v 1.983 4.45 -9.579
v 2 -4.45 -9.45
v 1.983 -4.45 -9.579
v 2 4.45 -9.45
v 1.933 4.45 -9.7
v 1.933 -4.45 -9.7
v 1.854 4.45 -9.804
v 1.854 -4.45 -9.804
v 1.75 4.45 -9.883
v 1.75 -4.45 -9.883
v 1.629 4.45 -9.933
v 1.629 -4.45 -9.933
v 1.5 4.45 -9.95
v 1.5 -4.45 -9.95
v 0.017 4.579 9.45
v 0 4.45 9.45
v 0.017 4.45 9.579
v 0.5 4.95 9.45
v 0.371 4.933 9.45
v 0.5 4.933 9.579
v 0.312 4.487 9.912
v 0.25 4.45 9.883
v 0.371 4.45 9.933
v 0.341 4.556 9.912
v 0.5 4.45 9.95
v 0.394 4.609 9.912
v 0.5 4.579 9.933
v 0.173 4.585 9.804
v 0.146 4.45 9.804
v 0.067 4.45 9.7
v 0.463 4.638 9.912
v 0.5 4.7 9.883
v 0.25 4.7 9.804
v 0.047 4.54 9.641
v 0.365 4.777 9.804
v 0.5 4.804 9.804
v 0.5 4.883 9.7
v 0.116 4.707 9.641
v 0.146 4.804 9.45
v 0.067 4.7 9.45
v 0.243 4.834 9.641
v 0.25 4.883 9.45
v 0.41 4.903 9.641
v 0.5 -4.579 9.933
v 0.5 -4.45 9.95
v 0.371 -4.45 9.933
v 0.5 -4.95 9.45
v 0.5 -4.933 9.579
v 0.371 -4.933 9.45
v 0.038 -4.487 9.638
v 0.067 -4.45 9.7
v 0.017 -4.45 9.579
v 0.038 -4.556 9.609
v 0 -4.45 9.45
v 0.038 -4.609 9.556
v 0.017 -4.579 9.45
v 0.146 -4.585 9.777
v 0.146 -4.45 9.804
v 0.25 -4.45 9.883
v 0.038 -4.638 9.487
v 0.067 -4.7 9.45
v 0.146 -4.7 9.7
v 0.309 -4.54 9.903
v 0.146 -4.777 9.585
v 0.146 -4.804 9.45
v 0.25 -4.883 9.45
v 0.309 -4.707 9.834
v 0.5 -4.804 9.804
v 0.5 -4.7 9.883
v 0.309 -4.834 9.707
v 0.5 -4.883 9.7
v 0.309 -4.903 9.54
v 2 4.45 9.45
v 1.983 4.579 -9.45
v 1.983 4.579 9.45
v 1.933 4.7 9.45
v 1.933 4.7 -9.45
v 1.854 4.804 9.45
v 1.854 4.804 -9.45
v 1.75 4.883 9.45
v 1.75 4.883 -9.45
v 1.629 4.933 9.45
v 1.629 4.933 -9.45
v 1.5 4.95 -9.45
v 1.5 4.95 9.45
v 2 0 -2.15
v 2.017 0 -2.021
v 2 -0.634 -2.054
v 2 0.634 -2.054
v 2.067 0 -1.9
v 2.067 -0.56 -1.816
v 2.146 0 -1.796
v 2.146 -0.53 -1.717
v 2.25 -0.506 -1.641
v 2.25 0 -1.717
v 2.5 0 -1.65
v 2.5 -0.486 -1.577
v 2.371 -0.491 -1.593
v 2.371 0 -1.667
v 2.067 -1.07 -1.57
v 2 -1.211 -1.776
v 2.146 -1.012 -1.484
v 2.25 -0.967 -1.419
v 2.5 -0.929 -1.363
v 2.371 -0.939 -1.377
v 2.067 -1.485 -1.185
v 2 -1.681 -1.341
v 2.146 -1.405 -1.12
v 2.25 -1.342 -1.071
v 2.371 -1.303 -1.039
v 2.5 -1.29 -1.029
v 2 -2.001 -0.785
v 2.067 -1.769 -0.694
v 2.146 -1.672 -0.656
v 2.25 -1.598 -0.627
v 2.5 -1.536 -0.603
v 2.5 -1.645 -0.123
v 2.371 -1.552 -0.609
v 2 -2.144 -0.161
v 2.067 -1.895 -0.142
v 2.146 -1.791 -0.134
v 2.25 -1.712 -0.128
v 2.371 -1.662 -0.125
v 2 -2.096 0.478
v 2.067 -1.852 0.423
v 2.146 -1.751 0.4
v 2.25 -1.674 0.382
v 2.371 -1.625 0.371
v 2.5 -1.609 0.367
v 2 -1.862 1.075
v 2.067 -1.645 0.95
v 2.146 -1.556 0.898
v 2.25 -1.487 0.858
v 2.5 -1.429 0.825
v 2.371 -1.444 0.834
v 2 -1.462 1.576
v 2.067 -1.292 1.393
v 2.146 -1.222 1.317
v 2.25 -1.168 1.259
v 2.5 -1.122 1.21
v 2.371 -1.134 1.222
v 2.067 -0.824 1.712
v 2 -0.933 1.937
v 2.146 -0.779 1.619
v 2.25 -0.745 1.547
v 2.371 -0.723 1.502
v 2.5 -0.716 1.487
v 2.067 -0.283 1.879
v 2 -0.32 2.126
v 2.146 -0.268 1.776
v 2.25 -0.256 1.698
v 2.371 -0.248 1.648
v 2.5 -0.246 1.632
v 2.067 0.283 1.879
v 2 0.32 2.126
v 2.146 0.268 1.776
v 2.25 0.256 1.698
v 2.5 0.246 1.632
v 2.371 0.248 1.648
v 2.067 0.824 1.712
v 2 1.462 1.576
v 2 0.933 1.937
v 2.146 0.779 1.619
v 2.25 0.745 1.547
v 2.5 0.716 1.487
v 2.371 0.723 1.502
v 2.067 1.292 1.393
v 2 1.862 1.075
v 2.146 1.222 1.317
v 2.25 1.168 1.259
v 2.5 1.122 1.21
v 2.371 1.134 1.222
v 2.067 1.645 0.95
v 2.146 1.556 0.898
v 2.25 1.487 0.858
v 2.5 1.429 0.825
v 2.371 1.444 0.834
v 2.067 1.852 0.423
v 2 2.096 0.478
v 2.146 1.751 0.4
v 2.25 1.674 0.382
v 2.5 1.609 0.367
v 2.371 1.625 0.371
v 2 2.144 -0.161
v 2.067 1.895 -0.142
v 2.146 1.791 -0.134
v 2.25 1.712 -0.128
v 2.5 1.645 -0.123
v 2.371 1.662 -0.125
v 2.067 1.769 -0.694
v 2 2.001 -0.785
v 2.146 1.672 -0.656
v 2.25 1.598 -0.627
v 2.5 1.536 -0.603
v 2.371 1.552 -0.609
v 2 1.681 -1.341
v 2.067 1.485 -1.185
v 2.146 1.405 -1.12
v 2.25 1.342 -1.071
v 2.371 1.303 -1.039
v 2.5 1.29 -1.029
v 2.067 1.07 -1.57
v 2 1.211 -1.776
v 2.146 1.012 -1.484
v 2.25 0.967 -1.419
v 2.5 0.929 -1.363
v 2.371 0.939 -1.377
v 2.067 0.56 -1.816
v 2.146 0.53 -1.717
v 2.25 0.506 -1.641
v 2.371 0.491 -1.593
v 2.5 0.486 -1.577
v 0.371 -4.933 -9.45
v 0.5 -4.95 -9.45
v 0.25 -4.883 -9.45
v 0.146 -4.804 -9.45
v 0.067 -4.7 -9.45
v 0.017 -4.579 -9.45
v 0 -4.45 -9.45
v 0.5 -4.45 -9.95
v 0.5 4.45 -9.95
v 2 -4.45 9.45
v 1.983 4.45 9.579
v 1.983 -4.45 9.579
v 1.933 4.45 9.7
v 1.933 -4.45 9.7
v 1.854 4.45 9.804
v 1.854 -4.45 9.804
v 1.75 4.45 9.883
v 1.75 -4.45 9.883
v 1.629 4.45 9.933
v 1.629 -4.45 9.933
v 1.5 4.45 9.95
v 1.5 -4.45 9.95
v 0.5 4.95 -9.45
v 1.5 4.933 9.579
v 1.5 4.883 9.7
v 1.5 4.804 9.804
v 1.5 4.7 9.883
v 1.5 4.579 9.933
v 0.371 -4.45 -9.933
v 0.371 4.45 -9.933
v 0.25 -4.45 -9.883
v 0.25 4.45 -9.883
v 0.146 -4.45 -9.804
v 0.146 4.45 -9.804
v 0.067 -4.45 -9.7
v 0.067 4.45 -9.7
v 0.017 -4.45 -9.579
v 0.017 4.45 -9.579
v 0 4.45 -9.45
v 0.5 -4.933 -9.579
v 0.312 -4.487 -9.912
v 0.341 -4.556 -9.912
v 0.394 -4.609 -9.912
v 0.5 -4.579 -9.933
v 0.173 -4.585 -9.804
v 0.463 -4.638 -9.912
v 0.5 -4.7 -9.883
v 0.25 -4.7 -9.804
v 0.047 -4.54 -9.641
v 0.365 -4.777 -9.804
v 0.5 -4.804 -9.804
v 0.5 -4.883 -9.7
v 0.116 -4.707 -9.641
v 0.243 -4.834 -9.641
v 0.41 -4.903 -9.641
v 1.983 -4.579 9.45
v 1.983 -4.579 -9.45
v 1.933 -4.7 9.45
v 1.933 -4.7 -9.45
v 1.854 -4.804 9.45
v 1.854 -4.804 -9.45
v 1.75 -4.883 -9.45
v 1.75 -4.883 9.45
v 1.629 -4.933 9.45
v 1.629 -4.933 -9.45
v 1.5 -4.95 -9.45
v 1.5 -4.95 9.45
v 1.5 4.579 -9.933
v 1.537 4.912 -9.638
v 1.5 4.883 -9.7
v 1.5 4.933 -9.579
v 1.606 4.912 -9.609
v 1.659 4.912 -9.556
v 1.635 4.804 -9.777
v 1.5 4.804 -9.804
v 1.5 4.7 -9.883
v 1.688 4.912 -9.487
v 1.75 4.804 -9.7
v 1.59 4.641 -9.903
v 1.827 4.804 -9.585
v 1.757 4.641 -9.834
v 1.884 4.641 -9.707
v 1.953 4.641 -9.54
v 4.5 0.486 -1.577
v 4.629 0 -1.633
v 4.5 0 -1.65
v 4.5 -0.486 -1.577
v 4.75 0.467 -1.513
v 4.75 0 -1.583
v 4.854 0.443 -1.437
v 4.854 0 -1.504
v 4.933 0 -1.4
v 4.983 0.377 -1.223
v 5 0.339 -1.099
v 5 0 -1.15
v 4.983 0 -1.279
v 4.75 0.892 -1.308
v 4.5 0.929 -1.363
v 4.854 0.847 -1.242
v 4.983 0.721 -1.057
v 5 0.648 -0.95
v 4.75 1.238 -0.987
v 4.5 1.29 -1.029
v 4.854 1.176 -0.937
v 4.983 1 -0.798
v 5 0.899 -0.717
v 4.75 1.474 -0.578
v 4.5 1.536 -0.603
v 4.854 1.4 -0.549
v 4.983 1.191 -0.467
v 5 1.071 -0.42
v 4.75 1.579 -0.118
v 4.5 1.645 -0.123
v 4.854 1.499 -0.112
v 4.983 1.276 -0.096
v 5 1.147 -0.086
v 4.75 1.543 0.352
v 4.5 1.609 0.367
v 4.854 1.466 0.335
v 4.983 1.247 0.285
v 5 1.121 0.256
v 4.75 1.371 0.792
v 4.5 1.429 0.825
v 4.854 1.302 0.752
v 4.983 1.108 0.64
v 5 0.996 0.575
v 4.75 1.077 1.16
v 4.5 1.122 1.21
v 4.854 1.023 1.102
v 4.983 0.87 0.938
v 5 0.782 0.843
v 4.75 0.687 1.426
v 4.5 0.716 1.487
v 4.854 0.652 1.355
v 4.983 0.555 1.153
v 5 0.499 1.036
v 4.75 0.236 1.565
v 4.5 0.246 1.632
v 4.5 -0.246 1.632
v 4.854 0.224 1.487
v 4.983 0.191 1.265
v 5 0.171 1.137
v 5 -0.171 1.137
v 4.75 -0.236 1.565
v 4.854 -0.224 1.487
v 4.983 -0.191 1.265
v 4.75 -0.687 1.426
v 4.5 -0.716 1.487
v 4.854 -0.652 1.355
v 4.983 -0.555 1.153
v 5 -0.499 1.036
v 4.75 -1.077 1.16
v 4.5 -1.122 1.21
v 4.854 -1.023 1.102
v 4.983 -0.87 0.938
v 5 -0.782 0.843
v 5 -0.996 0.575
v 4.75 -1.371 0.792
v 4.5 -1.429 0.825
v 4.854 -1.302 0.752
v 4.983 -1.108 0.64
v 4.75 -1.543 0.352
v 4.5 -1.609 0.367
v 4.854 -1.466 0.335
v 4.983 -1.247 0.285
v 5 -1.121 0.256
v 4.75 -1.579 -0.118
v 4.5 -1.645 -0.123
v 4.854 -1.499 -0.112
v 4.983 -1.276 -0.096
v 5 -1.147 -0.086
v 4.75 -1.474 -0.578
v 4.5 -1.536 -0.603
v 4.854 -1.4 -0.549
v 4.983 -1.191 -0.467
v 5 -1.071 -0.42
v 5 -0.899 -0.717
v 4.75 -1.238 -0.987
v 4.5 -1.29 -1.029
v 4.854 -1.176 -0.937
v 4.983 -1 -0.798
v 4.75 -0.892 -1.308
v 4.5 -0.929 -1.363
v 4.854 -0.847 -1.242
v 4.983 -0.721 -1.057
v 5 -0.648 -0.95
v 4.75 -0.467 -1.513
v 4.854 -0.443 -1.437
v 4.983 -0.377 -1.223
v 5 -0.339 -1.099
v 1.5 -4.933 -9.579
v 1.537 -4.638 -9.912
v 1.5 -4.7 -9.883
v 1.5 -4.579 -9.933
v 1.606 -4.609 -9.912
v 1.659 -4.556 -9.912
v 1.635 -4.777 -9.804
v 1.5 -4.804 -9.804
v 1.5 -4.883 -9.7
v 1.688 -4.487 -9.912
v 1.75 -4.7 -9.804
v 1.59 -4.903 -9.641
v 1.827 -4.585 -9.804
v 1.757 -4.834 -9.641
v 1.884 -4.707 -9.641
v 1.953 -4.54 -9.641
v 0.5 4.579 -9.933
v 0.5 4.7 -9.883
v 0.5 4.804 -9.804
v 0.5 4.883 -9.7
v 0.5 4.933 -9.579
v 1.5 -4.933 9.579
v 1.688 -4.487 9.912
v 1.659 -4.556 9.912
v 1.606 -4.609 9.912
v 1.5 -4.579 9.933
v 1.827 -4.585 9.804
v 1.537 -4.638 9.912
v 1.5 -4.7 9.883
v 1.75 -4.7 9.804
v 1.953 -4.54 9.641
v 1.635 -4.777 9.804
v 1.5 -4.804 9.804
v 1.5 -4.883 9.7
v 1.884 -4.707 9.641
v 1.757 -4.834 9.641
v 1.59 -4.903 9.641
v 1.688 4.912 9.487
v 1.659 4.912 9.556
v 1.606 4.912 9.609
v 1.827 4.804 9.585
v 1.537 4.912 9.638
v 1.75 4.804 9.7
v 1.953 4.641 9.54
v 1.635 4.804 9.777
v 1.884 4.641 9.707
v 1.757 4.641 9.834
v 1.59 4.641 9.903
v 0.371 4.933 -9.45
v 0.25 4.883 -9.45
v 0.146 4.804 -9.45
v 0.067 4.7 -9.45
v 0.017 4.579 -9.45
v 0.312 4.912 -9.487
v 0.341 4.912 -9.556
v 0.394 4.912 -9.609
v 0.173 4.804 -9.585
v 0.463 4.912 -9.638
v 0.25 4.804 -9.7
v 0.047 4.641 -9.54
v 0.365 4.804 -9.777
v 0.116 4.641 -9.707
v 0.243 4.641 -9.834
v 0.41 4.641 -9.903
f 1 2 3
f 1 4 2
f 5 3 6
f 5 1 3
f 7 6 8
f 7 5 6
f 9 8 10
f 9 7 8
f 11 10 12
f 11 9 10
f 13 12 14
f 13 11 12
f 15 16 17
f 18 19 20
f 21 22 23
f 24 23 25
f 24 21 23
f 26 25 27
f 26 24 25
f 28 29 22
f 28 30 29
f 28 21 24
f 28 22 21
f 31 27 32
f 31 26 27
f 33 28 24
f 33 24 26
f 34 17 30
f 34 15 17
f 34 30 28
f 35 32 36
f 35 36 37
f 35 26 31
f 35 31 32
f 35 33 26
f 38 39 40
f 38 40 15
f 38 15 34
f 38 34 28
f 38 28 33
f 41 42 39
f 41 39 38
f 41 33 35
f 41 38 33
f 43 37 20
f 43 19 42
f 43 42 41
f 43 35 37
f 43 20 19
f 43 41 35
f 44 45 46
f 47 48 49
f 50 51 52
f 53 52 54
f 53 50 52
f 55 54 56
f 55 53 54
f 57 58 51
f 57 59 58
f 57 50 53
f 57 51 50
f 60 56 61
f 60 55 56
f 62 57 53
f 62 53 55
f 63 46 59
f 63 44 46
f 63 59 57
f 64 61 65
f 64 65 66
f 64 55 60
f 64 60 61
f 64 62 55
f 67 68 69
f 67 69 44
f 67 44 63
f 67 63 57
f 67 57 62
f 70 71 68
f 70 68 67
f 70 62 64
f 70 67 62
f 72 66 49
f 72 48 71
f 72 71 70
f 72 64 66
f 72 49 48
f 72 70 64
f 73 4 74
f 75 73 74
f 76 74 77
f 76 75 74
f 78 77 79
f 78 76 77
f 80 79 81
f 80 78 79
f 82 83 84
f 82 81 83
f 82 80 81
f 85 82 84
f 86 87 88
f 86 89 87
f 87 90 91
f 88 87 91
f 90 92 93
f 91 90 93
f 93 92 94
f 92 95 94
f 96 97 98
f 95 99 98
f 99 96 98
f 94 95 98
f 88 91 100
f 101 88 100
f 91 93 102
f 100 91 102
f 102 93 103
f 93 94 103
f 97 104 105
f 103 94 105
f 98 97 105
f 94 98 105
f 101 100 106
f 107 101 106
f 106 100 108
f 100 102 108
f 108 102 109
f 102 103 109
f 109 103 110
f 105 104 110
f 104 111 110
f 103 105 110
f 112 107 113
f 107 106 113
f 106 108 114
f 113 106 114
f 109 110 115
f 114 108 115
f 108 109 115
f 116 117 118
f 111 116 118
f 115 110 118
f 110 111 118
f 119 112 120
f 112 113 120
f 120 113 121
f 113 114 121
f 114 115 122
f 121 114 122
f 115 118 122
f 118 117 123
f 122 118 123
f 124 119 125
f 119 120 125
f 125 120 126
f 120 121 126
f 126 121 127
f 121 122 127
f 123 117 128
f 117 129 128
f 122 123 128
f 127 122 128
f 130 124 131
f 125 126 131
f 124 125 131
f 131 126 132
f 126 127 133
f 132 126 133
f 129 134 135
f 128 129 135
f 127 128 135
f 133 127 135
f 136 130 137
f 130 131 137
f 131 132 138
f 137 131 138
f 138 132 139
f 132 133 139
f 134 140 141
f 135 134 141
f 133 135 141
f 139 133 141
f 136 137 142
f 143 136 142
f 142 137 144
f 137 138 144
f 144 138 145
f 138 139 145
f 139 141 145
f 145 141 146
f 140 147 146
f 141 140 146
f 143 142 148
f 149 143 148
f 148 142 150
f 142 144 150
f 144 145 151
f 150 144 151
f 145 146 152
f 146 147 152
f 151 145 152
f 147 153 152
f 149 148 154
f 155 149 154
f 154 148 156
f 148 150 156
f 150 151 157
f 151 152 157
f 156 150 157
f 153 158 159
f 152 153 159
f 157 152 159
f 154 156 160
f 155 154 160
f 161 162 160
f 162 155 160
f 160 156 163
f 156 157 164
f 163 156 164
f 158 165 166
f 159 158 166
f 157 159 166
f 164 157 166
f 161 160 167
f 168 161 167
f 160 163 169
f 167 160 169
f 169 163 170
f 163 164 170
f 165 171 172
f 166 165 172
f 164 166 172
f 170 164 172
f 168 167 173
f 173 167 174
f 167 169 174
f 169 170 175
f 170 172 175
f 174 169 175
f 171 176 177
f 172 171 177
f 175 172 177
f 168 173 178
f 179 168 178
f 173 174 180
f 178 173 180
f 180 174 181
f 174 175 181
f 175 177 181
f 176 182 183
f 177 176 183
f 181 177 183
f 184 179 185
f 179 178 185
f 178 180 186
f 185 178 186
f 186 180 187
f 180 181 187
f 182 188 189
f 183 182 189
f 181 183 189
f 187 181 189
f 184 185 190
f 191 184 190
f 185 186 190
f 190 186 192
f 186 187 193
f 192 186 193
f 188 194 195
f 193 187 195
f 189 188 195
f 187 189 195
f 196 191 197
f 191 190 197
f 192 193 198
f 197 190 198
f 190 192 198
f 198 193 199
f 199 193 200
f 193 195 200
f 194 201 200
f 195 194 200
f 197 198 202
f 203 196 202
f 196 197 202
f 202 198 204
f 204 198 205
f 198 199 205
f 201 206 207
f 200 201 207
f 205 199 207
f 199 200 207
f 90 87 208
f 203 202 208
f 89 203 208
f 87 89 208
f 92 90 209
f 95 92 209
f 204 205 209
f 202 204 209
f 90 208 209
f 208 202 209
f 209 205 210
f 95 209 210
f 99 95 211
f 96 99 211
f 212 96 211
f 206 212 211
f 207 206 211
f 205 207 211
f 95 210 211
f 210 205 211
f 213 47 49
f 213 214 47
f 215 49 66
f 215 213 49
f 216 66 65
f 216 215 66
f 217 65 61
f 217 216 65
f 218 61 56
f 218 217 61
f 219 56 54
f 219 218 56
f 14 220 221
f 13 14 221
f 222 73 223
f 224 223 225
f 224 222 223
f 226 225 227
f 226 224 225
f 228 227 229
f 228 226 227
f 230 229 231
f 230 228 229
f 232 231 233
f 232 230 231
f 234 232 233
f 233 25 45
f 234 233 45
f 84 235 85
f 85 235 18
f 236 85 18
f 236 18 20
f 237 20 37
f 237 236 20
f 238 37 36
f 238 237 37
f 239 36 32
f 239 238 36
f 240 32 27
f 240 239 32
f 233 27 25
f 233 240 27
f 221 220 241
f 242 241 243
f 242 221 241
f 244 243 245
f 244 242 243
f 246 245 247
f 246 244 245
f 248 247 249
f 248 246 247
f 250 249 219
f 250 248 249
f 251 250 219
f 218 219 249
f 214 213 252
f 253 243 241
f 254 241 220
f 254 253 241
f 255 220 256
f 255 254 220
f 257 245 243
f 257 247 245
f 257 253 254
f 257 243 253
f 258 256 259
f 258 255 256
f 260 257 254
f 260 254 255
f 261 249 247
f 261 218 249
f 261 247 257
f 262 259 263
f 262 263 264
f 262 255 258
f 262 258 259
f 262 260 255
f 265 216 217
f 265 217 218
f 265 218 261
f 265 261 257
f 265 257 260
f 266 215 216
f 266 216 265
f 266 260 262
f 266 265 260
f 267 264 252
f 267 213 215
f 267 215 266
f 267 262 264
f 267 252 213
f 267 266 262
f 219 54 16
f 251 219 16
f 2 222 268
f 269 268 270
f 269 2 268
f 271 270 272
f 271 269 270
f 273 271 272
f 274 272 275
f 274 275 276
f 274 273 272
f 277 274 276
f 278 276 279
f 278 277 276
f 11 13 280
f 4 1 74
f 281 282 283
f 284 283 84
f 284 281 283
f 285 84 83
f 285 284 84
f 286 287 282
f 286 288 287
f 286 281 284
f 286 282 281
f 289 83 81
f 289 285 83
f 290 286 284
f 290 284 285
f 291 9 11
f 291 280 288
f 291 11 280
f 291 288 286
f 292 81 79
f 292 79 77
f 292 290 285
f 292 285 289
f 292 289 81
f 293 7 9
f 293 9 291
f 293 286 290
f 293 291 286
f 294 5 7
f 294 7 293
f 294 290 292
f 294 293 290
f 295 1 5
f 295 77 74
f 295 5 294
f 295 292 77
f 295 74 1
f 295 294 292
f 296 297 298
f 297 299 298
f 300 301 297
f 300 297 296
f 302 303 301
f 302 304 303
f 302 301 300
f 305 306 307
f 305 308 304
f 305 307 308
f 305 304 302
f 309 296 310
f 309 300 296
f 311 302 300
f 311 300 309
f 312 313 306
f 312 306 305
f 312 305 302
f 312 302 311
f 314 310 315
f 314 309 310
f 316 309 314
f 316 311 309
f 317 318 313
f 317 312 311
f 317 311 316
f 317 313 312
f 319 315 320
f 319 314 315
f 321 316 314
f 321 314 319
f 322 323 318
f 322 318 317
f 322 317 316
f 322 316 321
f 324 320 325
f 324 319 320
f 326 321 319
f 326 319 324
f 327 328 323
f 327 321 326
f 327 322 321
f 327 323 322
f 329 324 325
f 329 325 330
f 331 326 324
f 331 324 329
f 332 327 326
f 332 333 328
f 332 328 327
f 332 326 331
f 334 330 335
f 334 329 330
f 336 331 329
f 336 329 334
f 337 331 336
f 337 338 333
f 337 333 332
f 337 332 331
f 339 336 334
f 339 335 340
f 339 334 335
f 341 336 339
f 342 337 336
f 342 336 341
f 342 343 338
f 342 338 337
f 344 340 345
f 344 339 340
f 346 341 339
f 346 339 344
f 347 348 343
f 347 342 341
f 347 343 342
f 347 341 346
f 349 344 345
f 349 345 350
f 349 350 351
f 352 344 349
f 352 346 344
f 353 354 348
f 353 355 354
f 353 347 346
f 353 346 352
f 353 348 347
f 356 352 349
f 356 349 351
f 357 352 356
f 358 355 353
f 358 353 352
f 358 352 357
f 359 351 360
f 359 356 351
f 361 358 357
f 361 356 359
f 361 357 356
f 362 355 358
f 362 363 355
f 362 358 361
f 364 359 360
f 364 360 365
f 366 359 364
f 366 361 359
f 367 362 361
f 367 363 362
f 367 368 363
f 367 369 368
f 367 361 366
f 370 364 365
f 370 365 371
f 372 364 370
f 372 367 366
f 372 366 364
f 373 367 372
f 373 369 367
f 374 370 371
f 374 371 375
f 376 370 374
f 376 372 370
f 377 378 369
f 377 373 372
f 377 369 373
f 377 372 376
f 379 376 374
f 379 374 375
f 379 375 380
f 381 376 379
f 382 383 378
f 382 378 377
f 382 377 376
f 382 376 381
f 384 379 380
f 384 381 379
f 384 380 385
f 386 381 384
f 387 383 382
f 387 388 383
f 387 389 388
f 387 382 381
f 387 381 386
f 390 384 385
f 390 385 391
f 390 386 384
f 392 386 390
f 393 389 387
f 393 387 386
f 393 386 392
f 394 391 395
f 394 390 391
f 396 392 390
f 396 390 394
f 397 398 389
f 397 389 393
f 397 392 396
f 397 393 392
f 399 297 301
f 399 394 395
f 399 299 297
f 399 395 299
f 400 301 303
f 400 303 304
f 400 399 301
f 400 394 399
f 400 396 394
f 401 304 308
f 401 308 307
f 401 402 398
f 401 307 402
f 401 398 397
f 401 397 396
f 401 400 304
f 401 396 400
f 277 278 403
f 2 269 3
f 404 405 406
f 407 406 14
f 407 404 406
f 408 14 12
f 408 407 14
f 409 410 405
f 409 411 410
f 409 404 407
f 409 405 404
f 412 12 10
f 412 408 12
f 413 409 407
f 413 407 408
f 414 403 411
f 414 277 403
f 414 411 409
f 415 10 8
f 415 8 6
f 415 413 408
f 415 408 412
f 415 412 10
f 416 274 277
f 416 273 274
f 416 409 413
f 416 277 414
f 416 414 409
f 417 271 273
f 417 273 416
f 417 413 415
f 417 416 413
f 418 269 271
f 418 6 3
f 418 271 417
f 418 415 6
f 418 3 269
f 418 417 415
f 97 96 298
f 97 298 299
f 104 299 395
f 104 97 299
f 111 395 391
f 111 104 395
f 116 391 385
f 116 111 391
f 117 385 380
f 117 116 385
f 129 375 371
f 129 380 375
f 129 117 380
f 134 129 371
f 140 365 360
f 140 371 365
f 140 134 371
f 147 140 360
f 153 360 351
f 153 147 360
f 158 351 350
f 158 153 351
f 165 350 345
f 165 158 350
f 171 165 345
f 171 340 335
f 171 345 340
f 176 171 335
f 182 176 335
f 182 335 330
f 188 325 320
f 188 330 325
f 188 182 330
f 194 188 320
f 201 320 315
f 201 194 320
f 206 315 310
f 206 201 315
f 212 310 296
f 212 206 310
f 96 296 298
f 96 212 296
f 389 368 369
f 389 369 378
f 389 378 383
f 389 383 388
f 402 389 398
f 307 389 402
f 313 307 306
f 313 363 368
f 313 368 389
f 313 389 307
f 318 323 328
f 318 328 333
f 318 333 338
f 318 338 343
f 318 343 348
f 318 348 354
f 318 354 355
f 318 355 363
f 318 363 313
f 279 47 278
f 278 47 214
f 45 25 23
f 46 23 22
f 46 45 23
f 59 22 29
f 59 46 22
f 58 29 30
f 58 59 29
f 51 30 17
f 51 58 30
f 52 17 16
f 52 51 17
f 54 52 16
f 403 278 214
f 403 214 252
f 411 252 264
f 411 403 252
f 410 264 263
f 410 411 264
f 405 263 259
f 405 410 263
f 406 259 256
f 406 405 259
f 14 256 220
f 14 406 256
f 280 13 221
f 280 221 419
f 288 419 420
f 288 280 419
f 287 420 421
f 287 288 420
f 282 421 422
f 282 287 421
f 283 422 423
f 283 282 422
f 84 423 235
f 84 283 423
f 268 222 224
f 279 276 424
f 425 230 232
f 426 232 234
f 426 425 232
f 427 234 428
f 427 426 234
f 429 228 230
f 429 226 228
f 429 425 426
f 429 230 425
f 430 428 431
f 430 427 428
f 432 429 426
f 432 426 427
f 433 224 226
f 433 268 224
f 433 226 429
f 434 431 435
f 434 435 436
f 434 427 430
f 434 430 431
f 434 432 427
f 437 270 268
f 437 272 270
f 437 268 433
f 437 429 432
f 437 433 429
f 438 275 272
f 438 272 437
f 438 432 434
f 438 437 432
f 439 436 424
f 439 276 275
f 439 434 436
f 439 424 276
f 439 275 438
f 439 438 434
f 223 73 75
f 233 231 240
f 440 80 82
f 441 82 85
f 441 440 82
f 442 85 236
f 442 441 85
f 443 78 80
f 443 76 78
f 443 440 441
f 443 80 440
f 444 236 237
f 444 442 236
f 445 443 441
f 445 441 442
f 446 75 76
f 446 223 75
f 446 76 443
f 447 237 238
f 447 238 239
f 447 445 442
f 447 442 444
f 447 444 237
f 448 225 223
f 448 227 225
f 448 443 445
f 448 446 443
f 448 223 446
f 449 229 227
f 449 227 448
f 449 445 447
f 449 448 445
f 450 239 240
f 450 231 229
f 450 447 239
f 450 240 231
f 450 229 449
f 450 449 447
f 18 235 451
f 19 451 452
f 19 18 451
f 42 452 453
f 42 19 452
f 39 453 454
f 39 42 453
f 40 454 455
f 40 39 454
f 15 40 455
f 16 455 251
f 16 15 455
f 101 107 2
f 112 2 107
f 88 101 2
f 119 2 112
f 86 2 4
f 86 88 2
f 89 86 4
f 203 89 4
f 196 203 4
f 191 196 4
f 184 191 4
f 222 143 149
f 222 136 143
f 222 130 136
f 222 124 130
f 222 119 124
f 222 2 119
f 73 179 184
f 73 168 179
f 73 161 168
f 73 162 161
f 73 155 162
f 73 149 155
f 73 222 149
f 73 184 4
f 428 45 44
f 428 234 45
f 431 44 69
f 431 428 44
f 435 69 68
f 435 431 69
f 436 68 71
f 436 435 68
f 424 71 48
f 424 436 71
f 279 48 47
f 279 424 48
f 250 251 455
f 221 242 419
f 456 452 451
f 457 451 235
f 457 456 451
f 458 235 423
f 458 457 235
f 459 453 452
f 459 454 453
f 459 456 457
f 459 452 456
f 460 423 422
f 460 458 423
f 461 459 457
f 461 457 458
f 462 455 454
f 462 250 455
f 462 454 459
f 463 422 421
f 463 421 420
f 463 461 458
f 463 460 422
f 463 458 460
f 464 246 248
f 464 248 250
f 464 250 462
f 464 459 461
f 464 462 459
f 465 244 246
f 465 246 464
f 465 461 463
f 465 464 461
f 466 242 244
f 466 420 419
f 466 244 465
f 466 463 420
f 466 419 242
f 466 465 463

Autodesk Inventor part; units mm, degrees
ref_plane "YZ Plane" through (0, 0, 0) normal (1, 0, 0) x (0, 1, 0)
ref_plane "XZ Plane" through (0, 0, 0) normal (0, 1, 0) x (-1, 0, 0)
ref_plane "XY Plane" through (0, 0, 0) normal (0, 0, 1) x (1, 0, 0)
sketch "Sketch1" plane through (0, 0, 0) normal (1, 0, 0) x (0, 1, 0)
  line L0 (0, 13.93) -> (0, -13.93) construction
  line L1 (-6.93, 0) -> (6.93, 0) construction
  line L2 (4.95, 9.95) -> (-4.95, 9.95)
  line L3 (-4.95, 9.95) -> (-4.95, -9.95)
  line L4 (-4.95, -9.95) -> (4.95, -9.95)
  line L5 (4.95, -9.95) -> (4.95, 9.95)
  point P0 (0, 0)
  dimension "d0" = 9.9
  dimension "d1" = 19.9
extrude "Extrusion1" add sketch "Sketch1" along normal blind 2
sketch "Sketch2" plane through (2, 0, 0) normal (1, 0, 0) x (0, 0, -1)
  circle A0 centre (0, 0) radius 1.65
  dimension "d4" = 3.3
extrude "Extrusion2" add sketch "Sketch2" along normal blind 3
fillet "Fillet1" radius 0.5 2 edges at (2, 0, 1.65) (5, 0, 1.65)
fillet "Fillet2" radius 0.5 12 edges at (2, -4.95, 0) (2, 0, 9.95) (1, -4.95, 9.95) (0, -4.95, 0) (1, -4.95, -9.95) (2, 0, -9.95) (0, 0, -9.95) (1, 4.95, -9.95) (0, 4.95, 0) (2, 4.95, 0) (1, 4.95, 9.95) (0, 0, 9.95)
properties part number "10x20-sample-bottom-V1"
